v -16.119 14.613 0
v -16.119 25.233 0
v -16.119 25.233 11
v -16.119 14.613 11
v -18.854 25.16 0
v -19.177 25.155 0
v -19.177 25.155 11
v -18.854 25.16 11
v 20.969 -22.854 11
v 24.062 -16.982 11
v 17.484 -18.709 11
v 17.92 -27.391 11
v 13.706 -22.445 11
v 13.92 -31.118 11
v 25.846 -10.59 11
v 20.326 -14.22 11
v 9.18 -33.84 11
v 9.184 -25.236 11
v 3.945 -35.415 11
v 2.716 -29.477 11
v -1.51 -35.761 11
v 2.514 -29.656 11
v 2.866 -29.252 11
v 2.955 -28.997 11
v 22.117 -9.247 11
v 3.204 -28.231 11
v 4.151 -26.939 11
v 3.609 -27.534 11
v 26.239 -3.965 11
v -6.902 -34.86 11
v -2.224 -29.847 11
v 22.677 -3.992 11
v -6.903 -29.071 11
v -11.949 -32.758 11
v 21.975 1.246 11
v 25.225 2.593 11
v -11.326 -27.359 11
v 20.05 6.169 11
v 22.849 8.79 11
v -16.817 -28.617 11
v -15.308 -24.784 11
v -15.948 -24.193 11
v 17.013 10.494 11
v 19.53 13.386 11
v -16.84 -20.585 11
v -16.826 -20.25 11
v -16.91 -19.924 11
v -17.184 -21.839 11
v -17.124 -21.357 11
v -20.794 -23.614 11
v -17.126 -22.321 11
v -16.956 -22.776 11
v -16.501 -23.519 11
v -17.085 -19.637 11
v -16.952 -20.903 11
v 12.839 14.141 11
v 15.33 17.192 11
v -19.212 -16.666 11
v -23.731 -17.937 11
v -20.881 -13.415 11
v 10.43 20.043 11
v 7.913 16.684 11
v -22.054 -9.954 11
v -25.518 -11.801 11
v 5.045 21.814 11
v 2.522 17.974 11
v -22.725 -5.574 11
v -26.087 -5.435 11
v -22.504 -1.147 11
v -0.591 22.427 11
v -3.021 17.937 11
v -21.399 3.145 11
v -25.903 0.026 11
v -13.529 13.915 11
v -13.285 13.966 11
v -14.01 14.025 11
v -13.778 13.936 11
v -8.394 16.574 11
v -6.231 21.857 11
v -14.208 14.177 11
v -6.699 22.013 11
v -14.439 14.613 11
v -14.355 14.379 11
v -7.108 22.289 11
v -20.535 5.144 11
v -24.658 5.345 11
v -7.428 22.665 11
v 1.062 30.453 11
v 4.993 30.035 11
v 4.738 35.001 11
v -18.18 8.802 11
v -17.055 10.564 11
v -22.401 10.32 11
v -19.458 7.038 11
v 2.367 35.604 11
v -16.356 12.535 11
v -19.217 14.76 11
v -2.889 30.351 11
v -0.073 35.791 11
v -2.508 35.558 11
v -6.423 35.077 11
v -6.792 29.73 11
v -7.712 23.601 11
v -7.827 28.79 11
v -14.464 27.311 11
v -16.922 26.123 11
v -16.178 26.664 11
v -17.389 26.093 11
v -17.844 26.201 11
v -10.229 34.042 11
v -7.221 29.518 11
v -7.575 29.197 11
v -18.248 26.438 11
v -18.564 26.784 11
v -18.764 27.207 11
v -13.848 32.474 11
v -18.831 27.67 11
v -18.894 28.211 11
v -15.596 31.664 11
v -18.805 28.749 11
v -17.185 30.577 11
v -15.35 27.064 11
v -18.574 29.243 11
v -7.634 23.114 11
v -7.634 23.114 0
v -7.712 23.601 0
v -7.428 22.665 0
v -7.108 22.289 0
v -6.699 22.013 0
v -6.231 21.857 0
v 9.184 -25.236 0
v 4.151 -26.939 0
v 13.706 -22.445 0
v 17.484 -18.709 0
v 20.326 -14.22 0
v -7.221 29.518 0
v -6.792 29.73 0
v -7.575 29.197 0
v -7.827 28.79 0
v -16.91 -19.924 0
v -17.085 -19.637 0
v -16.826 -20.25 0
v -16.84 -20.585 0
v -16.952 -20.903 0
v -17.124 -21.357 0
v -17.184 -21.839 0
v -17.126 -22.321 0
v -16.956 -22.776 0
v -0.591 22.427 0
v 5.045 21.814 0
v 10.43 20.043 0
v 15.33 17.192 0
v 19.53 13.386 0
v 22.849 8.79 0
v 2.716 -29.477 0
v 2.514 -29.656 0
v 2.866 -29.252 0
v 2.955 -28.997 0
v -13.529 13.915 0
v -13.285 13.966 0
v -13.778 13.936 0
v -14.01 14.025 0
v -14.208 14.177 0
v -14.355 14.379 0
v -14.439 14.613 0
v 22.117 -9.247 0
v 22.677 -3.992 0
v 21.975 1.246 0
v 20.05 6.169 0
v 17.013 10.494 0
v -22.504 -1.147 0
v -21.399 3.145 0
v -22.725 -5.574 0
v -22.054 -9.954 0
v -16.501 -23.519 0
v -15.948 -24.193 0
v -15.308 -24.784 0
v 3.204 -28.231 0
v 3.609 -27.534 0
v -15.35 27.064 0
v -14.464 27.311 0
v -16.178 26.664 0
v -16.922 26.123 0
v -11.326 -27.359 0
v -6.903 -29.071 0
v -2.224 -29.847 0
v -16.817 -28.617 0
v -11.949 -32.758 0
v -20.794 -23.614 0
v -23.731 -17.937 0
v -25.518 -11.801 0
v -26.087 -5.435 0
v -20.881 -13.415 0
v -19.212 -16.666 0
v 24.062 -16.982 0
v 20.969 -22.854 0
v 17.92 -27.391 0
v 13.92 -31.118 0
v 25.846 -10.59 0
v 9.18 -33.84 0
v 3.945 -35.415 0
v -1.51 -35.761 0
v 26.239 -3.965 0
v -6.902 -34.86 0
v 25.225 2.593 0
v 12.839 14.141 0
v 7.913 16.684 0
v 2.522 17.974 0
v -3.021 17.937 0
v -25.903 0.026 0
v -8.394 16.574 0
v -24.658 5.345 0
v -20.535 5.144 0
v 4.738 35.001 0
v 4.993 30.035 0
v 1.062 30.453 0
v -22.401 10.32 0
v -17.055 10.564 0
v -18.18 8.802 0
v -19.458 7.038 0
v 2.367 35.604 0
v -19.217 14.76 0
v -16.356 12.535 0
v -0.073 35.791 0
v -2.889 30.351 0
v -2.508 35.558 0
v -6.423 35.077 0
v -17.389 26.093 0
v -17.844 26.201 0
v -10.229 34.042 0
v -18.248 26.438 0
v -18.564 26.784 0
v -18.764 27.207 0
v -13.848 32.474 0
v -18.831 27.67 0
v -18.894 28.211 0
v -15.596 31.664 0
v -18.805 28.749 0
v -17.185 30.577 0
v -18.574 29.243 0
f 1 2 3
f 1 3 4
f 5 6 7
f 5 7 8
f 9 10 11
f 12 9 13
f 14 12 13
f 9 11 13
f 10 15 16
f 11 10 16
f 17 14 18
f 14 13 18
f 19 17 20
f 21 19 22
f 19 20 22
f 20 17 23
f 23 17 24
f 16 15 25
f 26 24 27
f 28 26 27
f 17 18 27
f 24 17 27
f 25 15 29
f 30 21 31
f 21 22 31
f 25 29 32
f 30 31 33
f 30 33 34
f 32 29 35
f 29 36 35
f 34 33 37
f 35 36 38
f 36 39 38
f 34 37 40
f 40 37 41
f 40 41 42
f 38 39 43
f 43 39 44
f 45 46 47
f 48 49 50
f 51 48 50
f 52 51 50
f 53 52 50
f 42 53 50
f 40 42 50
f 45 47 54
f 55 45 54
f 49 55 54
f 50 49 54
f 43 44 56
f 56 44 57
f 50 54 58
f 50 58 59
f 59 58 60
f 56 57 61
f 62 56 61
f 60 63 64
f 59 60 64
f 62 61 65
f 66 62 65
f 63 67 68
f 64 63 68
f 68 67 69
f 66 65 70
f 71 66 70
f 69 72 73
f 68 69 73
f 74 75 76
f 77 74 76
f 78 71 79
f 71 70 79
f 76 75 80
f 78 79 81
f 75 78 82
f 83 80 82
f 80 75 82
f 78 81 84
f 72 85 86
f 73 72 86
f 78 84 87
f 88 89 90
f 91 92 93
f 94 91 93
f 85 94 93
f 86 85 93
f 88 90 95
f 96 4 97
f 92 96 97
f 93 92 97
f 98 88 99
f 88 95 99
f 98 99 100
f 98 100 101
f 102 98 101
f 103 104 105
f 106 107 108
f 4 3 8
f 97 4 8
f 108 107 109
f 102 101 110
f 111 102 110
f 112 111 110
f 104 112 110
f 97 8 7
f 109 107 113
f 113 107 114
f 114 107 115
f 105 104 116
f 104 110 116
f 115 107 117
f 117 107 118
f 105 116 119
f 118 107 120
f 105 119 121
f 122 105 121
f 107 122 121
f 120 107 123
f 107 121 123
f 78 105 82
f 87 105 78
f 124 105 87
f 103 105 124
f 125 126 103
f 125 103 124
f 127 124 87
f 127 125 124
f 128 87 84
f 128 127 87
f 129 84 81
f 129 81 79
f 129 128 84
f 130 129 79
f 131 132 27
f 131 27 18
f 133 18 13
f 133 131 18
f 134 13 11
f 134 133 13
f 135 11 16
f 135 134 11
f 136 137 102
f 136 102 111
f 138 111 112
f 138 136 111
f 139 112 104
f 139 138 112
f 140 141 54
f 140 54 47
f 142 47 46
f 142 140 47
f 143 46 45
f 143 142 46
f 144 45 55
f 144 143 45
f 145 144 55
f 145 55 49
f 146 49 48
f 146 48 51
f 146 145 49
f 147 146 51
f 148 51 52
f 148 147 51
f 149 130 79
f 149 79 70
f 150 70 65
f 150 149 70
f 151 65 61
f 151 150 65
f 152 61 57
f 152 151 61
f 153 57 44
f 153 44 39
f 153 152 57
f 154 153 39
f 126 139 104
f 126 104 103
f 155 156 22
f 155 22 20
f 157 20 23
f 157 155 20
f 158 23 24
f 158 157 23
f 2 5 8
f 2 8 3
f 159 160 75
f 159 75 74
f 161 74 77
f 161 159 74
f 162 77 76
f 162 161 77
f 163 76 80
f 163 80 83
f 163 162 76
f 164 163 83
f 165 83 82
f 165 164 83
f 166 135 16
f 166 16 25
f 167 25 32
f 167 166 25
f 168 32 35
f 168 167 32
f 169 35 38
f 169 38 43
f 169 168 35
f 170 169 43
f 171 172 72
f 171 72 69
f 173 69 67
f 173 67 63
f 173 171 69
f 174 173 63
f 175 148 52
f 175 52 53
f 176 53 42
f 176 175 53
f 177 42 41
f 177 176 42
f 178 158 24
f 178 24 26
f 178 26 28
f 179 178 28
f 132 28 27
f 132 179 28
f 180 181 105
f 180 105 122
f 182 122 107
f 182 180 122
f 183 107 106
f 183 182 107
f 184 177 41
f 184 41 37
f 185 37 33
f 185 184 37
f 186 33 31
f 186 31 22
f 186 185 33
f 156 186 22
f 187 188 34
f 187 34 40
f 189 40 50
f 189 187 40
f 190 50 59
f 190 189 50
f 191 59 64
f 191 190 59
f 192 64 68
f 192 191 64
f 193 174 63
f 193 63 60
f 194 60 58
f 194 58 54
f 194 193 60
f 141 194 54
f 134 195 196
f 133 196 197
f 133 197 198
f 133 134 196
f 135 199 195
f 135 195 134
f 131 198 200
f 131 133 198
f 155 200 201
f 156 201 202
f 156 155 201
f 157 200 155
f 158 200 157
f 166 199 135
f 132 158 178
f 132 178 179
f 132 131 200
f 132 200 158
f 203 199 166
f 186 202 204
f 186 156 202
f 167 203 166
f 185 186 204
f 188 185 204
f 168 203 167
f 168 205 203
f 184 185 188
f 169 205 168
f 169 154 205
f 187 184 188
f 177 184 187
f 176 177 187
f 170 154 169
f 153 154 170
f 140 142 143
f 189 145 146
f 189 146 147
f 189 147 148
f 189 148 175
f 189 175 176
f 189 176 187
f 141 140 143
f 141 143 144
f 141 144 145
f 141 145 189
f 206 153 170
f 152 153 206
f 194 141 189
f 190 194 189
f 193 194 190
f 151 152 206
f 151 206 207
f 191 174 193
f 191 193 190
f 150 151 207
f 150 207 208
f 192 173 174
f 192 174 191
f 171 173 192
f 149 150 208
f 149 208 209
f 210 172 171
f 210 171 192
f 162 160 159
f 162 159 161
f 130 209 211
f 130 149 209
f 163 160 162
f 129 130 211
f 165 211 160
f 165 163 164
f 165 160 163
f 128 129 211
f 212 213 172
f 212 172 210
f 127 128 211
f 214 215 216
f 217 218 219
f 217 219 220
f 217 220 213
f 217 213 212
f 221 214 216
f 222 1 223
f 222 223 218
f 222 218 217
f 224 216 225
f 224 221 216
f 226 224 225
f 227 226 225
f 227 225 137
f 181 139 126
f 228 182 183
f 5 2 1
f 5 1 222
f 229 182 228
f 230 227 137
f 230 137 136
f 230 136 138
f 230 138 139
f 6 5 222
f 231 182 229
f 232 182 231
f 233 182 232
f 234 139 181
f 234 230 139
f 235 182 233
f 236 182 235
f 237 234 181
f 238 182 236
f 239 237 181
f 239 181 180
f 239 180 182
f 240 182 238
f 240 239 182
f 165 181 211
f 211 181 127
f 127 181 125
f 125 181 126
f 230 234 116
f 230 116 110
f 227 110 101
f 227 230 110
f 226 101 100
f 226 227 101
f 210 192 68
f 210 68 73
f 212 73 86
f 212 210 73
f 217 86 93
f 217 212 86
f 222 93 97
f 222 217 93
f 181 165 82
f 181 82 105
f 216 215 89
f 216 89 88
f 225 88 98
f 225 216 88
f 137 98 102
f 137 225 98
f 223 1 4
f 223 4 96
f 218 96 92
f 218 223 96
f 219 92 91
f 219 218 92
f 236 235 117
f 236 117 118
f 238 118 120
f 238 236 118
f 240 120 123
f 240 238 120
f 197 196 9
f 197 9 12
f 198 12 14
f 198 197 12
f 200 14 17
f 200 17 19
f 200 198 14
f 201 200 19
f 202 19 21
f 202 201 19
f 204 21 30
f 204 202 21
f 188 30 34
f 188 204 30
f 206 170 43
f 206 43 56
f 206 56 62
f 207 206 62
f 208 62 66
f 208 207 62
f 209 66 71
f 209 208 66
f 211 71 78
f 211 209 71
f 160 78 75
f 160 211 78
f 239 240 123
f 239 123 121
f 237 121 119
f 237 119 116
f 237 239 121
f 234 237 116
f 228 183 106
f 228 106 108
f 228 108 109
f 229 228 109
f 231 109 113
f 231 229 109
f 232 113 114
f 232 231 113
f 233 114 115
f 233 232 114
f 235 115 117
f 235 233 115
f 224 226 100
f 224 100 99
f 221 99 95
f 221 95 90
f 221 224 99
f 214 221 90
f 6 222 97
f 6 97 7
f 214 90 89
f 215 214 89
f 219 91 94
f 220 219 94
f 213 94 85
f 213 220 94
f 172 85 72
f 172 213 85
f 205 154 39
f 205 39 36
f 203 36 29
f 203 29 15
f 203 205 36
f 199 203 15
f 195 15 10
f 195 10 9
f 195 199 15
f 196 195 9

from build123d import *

# Parameters (mm, degrees)
BOSS_EXTRUDE1_DEPTH = 11


with BuildPart() as part:
    # Sketch1 → Boss-Extrude1 (new body)
    with BuildSketch(Plane.XY):
        with BuildLine():
            Line((-18.853830773, 25.160435071), (-16.119000888, 25.233110696))
            Line((-16.119000888, 25.233110696), (-16.119000888, 14.613334924))
            ThreePointArc((-16.119000888, 14.613334924), (-16.64958264, 11.530072447), (-18.180286861, 8.801525384))
            ThreePointArc((-18.180286861, 8.801525384), (-20.022572688, 6.105775505), (-21.399060798, 3.144970722))
            ThreePointArc((-21.399060798, 3.144970722), (-22.726569744, -3.354769567), (-22.053552104, -9.954462823))
            ThreePointArc((-22.053552104, -9.954462823), (-20.106400366, -15.071180428), (-17.085436321, -19.636919707))
            ThreePointArc((-17.085436321, -19.636919707), (-16.826323912, -20.249507523), (-16.951603049, -20.902736587))
            ThreePointArc((-16.951603049, -20.902736587), (-17.18386468, -21.838882371), (-16.955503917, -22.775987357))
            ThreePointArc((-16.955503917, -22.775987357), (-16.236029845, -23.865360174), (-15.307939029, -24.783523292))
            ThreePointArc((-15.307939029, -24.783523292), (-6.902922169, -29.070783982), (2.514195466, -29.656282157))
            ThreePointArc((2.514195466, -29.656282157), (2.798104907, -29.369092957), (2.954895281, -28.996938438))
            ThreePointArc((2.954895281, -28.996938438), (3.387996909, -27.87172525), (4.151482129, -26.938573569))
            ThreePointArc((4.151482129, -26.938573569), (13.70577614, -22.445002036), (20.325671696, -14.219814986))
            ThreePointArc((20.325671696, -14.219814986), (22.482847249, -1.351664436), (17.013236546, 10.494265824))
            ThreePointArc((17.013236546, 10.494265824), (2.522103549, 17.974028049), (-13.285319782, 13.96589306))
            ThreePointArc((-13.285319782, 13.96589306), (-14.010252719, 14.025446056), (-14.438576198, 14.613334924))
            Line((-14.438576198, 14.613334924), (-14.463639713, 27.310804635))
            ThreePointArc((-14.463639713, 27.310804635), (-15.772674476, 26.882496645), (-16.921609527, 26.122912554))
            ThreePointArc((-16.921609527, 26.122912554), (-18.247717994, 26.438122976), (-18.831203914, 27.669977456))
            ThreePointArc((-18.831203914, 27.669977456), (-18.868217492, 28.483440244), (-18.573500133, 29.242540627))
            ThreePointArc((-18.573500133, 29.242540627), (-16.413121418, 31.153842986), (-13.848257568, 32.473610515))
            ThreePointArc((-13.848257568, 32.473610515), (-8.344696861, 34.627822793), (-2.50820992, 35.558000832))
            ThreePointArc((-2.50820992, 35.558000832), (1.150912858, 35.75032292), (4.737729096, 35.001379281))
            Line((4.737729096, 35.001379281), (4.992549443, 30.035082131))
            ThreePointArc((4.992549443, 30.035082131), (-0.915054965, 30.467339098), (-6.792394138, 29.7301009))
            ThreePointArc((-6.792394138, 29.7301009), (-7.409462923, 29.370020494), (-7.826896167, 28.790209084))
            Line((-7.826896167, 28.790209084), (-7.712079502, 23.601110726))
            ThreePointArc((-7.712079502, 23.601110726), (-7.280949637, 22.466131343), (-6.230949855, 21.856581002))
            ThreePointArc((-6.230949855, 21.856581002), (10.429887602, 20.043351617), (22.848599934, 8.789601594))
            ThreePointArc((22.848599934, 8.789601594), (26.218834648, -7.288142965), (20.968539738, -22.853706092))
            ThreePointArc((20.968539738, -22.853706092), (6.607574044, -34.777230529), (-11.948618389, -32.758445472))
            ThreePointArc((-11.948618389, -32.758445472), (-22.400695848, -20.847022299), (-26.08676765, -5.434663624))
            ThreePointArc((-26.08676765, -5.434663624), (-24.658208176, 5.345172428), (-19.217331386, 14.760187417))
            Line((-19.217331386, 14.760187417), (-19.177343822, 25.15499714))
            Line((-19.177343822, 25.15499714), (-18.853830773, 25.160435071))
        make_face()
    extrude(amount=BOSS_EXTRUDE1_DEPTH)


solid = part.part
